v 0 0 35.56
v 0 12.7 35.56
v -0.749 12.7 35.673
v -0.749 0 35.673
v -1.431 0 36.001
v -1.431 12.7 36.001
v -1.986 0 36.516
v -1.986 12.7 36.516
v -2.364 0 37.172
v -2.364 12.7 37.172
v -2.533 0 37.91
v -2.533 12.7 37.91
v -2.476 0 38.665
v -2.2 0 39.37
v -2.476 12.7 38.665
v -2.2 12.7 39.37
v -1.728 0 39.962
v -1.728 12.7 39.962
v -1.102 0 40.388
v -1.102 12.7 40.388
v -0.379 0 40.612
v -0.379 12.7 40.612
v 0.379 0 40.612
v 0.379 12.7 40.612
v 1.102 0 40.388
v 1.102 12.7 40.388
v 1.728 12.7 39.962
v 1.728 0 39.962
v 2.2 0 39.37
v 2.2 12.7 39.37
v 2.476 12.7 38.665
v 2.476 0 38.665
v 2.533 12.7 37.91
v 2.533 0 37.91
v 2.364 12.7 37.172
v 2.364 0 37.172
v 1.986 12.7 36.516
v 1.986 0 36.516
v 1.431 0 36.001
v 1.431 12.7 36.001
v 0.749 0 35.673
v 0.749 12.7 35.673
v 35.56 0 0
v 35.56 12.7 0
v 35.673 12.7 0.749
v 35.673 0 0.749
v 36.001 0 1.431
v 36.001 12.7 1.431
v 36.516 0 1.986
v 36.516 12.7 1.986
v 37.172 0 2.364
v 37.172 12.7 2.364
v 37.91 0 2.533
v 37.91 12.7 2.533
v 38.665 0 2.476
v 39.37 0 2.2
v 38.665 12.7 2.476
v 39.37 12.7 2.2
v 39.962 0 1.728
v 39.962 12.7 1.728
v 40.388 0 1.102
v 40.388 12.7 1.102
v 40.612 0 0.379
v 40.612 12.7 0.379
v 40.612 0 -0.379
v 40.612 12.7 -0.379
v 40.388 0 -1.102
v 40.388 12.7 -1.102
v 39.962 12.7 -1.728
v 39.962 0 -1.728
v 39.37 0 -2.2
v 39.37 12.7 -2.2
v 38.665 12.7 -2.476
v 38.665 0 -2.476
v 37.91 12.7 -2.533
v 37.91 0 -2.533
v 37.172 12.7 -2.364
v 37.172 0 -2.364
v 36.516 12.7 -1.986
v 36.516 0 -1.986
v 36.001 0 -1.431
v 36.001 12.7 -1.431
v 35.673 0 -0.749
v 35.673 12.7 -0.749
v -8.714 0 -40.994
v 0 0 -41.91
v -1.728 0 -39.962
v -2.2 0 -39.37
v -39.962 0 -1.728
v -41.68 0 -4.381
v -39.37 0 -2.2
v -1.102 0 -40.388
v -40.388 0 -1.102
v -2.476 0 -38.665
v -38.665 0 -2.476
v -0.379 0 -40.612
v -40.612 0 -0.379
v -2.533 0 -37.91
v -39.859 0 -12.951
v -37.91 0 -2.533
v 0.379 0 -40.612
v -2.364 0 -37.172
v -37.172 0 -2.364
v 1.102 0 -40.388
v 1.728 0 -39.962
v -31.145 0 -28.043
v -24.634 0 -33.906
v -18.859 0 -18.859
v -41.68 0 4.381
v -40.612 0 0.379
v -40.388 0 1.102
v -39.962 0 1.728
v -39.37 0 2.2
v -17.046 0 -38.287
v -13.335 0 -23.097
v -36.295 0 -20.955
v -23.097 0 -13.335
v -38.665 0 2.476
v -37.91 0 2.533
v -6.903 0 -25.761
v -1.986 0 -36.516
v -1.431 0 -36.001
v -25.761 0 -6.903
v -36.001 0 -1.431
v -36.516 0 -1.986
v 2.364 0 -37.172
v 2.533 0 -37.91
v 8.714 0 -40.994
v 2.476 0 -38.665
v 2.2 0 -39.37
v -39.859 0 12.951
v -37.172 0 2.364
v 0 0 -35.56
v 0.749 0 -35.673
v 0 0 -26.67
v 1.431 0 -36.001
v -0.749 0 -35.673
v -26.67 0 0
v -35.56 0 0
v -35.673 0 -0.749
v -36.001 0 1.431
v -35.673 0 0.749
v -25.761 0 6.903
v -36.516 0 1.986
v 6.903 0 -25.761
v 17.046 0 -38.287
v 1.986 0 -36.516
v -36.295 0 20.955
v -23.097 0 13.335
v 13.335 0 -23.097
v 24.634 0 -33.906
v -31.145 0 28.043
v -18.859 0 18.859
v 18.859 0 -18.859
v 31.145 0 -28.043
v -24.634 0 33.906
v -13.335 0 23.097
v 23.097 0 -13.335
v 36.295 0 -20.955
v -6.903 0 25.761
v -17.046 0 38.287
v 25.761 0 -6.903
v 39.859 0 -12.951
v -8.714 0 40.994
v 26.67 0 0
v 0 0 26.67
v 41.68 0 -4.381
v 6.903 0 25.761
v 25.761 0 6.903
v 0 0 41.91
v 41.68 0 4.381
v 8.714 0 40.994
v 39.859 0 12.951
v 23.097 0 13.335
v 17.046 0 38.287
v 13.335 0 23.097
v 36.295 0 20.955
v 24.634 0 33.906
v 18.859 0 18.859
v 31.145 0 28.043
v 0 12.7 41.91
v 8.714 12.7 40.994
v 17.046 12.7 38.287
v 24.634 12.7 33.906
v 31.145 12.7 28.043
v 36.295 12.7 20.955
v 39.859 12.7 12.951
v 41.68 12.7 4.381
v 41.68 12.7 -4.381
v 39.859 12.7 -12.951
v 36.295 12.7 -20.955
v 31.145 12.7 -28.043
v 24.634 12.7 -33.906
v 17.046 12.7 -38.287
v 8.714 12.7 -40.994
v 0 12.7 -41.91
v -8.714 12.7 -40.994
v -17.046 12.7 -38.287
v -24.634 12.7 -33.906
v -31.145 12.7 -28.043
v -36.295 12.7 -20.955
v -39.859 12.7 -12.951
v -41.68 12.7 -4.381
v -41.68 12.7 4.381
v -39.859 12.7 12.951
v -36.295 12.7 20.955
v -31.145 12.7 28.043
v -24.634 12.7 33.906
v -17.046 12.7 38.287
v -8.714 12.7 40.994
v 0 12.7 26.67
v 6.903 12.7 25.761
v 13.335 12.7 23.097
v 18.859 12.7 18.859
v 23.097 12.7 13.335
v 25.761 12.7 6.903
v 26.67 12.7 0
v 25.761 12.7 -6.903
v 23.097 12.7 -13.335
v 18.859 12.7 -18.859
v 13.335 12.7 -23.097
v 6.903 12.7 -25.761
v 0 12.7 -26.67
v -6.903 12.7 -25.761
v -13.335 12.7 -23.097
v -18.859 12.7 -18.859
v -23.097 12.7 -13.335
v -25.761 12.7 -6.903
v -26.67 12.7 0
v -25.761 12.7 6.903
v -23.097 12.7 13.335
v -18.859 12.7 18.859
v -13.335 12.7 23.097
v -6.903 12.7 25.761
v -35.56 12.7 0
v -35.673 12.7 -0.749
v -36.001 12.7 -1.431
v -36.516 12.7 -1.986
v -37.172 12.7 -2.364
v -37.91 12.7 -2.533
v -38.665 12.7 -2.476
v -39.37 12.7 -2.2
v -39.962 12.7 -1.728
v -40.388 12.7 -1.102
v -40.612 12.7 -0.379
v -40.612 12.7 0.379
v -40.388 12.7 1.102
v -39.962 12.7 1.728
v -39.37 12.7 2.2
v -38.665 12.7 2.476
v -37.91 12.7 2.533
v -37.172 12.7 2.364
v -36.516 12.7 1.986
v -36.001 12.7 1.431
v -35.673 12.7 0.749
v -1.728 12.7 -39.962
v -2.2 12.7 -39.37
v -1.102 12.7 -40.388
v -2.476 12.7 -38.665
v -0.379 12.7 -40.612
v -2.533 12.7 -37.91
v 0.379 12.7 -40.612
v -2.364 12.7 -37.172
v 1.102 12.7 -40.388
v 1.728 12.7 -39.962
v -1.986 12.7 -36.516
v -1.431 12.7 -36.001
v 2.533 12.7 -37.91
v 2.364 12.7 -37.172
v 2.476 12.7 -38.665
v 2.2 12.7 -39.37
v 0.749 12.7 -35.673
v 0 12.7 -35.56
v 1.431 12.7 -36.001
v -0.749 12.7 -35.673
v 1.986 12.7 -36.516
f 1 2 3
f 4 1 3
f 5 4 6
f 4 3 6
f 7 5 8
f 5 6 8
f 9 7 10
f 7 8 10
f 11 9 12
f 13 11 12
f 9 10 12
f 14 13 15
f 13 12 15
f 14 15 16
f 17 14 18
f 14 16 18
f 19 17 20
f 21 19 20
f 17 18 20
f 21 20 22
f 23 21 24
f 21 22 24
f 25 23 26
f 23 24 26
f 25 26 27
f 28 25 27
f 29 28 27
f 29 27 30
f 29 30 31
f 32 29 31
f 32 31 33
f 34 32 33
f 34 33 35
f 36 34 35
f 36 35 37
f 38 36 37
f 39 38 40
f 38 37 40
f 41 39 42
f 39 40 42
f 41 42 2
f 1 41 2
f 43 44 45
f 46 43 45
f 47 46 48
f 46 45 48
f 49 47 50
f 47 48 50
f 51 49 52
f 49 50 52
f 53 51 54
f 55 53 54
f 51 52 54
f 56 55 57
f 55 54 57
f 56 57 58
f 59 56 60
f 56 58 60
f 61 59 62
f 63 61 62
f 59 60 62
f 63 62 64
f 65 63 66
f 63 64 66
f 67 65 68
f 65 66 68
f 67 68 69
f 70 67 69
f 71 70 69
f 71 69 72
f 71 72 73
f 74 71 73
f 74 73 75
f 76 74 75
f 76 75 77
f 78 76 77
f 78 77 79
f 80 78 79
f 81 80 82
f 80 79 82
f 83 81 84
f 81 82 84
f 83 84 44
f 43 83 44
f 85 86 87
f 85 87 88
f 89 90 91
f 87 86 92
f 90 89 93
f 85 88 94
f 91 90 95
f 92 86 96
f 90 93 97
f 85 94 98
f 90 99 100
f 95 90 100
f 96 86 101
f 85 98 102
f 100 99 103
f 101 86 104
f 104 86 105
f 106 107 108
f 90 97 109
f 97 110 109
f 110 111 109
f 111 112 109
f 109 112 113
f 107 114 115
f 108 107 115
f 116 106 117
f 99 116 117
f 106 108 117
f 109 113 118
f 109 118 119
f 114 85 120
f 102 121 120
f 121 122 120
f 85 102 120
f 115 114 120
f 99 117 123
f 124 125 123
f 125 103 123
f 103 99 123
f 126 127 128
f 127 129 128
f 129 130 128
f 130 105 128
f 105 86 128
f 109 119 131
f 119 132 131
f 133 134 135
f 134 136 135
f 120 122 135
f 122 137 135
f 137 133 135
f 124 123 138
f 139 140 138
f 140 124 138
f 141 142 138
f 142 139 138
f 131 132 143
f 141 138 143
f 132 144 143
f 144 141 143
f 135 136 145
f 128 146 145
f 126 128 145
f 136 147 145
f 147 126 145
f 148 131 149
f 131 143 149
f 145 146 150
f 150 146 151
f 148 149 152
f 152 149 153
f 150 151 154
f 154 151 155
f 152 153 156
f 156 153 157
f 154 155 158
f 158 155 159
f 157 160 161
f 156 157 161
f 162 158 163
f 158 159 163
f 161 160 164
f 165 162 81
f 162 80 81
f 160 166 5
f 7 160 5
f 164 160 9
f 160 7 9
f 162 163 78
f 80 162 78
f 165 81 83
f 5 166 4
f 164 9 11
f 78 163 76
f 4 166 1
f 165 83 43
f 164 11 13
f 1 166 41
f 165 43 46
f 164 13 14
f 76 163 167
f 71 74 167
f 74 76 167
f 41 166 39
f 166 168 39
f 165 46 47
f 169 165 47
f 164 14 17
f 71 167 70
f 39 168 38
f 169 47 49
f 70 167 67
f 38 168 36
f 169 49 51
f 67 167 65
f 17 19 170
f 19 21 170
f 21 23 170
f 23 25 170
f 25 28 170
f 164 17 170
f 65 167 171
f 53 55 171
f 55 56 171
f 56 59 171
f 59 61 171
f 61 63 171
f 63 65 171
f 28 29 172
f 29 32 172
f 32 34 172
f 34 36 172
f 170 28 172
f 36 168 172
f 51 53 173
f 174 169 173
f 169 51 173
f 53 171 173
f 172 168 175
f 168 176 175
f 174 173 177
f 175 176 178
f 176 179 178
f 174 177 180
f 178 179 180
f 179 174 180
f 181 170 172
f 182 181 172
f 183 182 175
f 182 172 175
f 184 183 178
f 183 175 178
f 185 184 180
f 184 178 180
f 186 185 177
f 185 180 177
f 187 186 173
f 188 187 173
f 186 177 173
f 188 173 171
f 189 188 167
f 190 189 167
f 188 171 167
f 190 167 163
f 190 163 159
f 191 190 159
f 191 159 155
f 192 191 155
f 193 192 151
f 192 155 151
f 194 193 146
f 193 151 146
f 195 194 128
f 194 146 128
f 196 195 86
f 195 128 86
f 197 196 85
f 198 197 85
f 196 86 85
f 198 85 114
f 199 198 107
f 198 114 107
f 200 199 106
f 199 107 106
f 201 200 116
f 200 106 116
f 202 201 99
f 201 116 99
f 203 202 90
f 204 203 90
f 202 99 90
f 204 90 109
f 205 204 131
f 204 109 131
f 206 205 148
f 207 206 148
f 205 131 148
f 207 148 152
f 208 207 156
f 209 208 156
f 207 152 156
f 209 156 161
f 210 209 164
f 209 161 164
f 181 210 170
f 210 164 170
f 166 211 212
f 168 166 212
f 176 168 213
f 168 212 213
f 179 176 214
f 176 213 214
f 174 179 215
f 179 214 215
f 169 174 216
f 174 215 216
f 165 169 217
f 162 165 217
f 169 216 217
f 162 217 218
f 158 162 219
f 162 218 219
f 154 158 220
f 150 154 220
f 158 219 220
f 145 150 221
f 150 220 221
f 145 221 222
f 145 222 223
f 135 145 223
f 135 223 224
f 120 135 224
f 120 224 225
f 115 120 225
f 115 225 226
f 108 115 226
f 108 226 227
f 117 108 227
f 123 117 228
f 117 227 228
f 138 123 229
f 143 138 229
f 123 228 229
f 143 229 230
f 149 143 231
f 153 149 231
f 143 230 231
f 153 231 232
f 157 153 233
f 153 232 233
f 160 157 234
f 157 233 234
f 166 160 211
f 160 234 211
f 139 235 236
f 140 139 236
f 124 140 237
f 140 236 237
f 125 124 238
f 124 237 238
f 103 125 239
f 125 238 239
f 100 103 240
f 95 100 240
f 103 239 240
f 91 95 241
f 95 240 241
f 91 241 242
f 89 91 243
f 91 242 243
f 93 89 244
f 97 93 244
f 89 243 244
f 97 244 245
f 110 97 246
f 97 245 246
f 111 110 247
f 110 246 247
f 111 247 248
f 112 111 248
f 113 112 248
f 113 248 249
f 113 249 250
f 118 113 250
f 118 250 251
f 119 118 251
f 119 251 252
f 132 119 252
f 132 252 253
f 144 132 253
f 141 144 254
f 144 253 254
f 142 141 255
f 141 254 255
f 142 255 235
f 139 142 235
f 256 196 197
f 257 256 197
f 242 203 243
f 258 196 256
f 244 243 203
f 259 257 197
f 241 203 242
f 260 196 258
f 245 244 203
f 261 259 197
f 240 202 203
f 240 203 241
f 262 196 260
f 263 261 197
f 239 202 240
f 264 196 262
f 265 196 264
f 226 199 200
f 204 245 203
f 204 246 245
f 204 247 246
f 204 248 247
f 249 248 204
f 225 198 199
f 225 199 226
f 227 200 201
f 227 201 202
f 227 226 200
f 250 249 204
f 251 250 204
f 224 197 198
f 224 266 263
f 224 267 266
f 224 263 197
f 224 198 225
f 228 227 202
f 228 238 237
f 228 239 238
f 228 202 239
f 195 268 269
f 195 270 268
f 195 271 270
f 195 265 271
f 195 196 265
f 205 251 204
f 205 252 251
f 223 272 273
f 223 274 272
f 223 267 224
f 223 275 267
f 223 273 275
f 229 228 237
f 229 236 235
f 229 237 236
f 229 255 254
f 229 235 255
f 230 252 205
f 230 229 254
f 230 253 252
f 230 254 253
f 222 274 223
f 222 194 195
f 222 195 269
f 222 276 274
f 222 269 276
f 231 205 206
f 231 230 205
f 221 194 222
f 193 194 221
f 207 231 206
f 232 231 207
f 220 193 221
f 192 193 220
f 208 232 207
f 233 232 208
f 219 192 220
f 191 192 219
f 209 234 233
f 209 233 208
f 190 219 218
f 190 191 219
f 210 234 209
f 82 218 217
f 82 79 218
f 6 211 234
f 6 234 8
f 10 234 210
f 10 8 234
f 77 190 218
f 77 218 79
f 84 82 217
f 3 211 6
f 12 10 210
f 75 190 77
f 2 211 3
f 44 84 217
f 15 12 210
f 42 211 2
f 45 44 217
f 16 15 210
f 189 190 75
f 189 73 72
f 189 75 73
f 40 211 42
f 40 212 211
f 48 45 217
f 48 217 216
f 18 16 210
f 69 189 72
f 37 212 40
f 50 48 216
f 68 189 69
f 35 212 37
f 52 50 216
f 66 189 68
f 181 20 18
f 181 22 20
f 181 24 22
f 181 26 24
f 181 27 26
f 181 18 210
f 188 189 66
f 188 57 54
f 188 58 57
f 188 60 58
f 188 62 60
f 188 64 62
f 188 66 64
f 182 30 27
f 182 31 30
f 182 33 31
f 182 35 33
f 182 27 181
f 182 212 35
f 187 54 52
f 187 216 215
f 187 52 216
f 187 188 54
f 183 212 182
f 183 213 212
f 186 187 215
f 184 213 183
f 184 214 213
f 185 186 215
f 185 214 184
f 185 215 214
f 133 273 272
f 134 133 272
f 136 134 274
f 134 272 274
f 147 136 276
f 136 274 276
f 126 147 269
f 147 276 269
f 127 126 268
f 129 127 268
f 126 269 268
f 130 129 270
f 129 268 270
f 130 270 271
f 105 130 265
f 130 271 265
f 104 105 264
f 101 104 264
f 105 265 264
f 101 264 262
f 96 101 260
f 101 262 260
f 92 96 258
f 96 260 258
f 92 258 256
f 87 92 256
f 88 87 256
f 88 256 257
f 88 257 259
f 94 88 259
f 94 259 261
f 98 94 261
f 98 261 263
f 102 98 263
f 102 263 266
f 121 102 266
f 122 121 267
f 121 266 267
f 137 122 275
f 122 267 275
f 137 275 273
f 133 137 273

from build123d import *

# Parameters (mm, degrees)
SKETCH1_R           = 41.91
BOSS_EXTRUDE1_DEPTH = 12.7
SKETCH2_R           = 13.97
CUT_EXTRUDE1_DEPTH  = 12.7
SKETCH2_3_R         = 26.67
SKETCH2_3_R_2       = 13.97
CUT_EXTRUDE2_DEPTH  = 12.7
SCALE1_SCALE        = 2
SCALE2_SCALE        = 0.5
SKETCH3_R           = 2.54
CUT_EXTRUDE3_DEPTH  = 12.7
CIRPATTERN1_COUNT   = 4


with BuildPart() as part:
    # Sketch1 → Boss-Extrude1 (new body)
    with BuildSketch(Plane(origin=(0, 0, 0), x_dir=(1, 0, 0), z_dir=(0, 1, 0))):
        with Locations(Location((0, 0, 0), (0, 0, 270))):
            Circle(SKETCH1_R)
    extrude(amount=BOSS_EXTRUDE1_DEPTH)

    # Sketch2 → Cut-Extrude1 (cut)
    with BuildSketch(Plane(origin=(0, 12.7, 0), x_dir=(1, 0, 0), z_dir=(0, 1, 0))):
        with Locations(Location((0, 0, 0), (0, 0, 270))):
            Circle(SKETCH2_R)
    extrude(amount=-CUT_EXTRUDE1_DEPTH, mode=Mode.SUBTRACT)

    # Sketch2<3> → Cut-Extrude2 (cut)
    with BuildSketch(Plane(origin=(0, 12.7, 0), x_dir=(1, 0, 0), z_dir=(0, 1, 0))):
        with Locations(Location((0, 0, 0), (0, 0, 270))):
            Circle(SKETCH2_3_R)
        Circle(SKETCH2_3_R_2, mode=Mode.SUBTRACT)
    extrude(amount=-CUT_EXTRUDE2_DEPTH, mode=Mode.SUBTRACT)


with BuildPart() as part_1:
    # Scale1: scaled about (0, 6.35, 0)
    add(part.part.scale(SCALE1_SCALE).moved(Location((0, -6.35, 0))))


with BuildPart() as part_2:
    # Scale2: scaled about (0, 6.35, 0)
    add(part_1.part.scale(SCALE2_SCALE).moved(Location((0, 3.175, 0))))

    # Sketch3 → Cut-Extrude3 (cut)
    with BuildSketch(Plane(origin=(0, 12.7, 0), x_dir=(1, 0, 0), z_dir=(0, 1, 0))):
        with Locations(Location((0, 38.1, 0), (0, 0, 270))):
            Circle(SKETCH3_R)
    cut_extrude3 = extrude(amount=-CUT_EXTRUDE3_DEPTH, mode=Mode.SUBTRACT)

    # CirPattern1: Cut-Extrude3 ×4 about axis
    cirpattern1_axis = Axis((0, 0, 0), (0, 1, 0))
    for i in range(1, CIRPATTERN1_COUNT):
        add(cut_extrude3.rotate(cirpattern1_axis, i * 360 / CIRPATTERN1_COUNT), mode=Mode.SUBTRACT)


solid = part_2.part
